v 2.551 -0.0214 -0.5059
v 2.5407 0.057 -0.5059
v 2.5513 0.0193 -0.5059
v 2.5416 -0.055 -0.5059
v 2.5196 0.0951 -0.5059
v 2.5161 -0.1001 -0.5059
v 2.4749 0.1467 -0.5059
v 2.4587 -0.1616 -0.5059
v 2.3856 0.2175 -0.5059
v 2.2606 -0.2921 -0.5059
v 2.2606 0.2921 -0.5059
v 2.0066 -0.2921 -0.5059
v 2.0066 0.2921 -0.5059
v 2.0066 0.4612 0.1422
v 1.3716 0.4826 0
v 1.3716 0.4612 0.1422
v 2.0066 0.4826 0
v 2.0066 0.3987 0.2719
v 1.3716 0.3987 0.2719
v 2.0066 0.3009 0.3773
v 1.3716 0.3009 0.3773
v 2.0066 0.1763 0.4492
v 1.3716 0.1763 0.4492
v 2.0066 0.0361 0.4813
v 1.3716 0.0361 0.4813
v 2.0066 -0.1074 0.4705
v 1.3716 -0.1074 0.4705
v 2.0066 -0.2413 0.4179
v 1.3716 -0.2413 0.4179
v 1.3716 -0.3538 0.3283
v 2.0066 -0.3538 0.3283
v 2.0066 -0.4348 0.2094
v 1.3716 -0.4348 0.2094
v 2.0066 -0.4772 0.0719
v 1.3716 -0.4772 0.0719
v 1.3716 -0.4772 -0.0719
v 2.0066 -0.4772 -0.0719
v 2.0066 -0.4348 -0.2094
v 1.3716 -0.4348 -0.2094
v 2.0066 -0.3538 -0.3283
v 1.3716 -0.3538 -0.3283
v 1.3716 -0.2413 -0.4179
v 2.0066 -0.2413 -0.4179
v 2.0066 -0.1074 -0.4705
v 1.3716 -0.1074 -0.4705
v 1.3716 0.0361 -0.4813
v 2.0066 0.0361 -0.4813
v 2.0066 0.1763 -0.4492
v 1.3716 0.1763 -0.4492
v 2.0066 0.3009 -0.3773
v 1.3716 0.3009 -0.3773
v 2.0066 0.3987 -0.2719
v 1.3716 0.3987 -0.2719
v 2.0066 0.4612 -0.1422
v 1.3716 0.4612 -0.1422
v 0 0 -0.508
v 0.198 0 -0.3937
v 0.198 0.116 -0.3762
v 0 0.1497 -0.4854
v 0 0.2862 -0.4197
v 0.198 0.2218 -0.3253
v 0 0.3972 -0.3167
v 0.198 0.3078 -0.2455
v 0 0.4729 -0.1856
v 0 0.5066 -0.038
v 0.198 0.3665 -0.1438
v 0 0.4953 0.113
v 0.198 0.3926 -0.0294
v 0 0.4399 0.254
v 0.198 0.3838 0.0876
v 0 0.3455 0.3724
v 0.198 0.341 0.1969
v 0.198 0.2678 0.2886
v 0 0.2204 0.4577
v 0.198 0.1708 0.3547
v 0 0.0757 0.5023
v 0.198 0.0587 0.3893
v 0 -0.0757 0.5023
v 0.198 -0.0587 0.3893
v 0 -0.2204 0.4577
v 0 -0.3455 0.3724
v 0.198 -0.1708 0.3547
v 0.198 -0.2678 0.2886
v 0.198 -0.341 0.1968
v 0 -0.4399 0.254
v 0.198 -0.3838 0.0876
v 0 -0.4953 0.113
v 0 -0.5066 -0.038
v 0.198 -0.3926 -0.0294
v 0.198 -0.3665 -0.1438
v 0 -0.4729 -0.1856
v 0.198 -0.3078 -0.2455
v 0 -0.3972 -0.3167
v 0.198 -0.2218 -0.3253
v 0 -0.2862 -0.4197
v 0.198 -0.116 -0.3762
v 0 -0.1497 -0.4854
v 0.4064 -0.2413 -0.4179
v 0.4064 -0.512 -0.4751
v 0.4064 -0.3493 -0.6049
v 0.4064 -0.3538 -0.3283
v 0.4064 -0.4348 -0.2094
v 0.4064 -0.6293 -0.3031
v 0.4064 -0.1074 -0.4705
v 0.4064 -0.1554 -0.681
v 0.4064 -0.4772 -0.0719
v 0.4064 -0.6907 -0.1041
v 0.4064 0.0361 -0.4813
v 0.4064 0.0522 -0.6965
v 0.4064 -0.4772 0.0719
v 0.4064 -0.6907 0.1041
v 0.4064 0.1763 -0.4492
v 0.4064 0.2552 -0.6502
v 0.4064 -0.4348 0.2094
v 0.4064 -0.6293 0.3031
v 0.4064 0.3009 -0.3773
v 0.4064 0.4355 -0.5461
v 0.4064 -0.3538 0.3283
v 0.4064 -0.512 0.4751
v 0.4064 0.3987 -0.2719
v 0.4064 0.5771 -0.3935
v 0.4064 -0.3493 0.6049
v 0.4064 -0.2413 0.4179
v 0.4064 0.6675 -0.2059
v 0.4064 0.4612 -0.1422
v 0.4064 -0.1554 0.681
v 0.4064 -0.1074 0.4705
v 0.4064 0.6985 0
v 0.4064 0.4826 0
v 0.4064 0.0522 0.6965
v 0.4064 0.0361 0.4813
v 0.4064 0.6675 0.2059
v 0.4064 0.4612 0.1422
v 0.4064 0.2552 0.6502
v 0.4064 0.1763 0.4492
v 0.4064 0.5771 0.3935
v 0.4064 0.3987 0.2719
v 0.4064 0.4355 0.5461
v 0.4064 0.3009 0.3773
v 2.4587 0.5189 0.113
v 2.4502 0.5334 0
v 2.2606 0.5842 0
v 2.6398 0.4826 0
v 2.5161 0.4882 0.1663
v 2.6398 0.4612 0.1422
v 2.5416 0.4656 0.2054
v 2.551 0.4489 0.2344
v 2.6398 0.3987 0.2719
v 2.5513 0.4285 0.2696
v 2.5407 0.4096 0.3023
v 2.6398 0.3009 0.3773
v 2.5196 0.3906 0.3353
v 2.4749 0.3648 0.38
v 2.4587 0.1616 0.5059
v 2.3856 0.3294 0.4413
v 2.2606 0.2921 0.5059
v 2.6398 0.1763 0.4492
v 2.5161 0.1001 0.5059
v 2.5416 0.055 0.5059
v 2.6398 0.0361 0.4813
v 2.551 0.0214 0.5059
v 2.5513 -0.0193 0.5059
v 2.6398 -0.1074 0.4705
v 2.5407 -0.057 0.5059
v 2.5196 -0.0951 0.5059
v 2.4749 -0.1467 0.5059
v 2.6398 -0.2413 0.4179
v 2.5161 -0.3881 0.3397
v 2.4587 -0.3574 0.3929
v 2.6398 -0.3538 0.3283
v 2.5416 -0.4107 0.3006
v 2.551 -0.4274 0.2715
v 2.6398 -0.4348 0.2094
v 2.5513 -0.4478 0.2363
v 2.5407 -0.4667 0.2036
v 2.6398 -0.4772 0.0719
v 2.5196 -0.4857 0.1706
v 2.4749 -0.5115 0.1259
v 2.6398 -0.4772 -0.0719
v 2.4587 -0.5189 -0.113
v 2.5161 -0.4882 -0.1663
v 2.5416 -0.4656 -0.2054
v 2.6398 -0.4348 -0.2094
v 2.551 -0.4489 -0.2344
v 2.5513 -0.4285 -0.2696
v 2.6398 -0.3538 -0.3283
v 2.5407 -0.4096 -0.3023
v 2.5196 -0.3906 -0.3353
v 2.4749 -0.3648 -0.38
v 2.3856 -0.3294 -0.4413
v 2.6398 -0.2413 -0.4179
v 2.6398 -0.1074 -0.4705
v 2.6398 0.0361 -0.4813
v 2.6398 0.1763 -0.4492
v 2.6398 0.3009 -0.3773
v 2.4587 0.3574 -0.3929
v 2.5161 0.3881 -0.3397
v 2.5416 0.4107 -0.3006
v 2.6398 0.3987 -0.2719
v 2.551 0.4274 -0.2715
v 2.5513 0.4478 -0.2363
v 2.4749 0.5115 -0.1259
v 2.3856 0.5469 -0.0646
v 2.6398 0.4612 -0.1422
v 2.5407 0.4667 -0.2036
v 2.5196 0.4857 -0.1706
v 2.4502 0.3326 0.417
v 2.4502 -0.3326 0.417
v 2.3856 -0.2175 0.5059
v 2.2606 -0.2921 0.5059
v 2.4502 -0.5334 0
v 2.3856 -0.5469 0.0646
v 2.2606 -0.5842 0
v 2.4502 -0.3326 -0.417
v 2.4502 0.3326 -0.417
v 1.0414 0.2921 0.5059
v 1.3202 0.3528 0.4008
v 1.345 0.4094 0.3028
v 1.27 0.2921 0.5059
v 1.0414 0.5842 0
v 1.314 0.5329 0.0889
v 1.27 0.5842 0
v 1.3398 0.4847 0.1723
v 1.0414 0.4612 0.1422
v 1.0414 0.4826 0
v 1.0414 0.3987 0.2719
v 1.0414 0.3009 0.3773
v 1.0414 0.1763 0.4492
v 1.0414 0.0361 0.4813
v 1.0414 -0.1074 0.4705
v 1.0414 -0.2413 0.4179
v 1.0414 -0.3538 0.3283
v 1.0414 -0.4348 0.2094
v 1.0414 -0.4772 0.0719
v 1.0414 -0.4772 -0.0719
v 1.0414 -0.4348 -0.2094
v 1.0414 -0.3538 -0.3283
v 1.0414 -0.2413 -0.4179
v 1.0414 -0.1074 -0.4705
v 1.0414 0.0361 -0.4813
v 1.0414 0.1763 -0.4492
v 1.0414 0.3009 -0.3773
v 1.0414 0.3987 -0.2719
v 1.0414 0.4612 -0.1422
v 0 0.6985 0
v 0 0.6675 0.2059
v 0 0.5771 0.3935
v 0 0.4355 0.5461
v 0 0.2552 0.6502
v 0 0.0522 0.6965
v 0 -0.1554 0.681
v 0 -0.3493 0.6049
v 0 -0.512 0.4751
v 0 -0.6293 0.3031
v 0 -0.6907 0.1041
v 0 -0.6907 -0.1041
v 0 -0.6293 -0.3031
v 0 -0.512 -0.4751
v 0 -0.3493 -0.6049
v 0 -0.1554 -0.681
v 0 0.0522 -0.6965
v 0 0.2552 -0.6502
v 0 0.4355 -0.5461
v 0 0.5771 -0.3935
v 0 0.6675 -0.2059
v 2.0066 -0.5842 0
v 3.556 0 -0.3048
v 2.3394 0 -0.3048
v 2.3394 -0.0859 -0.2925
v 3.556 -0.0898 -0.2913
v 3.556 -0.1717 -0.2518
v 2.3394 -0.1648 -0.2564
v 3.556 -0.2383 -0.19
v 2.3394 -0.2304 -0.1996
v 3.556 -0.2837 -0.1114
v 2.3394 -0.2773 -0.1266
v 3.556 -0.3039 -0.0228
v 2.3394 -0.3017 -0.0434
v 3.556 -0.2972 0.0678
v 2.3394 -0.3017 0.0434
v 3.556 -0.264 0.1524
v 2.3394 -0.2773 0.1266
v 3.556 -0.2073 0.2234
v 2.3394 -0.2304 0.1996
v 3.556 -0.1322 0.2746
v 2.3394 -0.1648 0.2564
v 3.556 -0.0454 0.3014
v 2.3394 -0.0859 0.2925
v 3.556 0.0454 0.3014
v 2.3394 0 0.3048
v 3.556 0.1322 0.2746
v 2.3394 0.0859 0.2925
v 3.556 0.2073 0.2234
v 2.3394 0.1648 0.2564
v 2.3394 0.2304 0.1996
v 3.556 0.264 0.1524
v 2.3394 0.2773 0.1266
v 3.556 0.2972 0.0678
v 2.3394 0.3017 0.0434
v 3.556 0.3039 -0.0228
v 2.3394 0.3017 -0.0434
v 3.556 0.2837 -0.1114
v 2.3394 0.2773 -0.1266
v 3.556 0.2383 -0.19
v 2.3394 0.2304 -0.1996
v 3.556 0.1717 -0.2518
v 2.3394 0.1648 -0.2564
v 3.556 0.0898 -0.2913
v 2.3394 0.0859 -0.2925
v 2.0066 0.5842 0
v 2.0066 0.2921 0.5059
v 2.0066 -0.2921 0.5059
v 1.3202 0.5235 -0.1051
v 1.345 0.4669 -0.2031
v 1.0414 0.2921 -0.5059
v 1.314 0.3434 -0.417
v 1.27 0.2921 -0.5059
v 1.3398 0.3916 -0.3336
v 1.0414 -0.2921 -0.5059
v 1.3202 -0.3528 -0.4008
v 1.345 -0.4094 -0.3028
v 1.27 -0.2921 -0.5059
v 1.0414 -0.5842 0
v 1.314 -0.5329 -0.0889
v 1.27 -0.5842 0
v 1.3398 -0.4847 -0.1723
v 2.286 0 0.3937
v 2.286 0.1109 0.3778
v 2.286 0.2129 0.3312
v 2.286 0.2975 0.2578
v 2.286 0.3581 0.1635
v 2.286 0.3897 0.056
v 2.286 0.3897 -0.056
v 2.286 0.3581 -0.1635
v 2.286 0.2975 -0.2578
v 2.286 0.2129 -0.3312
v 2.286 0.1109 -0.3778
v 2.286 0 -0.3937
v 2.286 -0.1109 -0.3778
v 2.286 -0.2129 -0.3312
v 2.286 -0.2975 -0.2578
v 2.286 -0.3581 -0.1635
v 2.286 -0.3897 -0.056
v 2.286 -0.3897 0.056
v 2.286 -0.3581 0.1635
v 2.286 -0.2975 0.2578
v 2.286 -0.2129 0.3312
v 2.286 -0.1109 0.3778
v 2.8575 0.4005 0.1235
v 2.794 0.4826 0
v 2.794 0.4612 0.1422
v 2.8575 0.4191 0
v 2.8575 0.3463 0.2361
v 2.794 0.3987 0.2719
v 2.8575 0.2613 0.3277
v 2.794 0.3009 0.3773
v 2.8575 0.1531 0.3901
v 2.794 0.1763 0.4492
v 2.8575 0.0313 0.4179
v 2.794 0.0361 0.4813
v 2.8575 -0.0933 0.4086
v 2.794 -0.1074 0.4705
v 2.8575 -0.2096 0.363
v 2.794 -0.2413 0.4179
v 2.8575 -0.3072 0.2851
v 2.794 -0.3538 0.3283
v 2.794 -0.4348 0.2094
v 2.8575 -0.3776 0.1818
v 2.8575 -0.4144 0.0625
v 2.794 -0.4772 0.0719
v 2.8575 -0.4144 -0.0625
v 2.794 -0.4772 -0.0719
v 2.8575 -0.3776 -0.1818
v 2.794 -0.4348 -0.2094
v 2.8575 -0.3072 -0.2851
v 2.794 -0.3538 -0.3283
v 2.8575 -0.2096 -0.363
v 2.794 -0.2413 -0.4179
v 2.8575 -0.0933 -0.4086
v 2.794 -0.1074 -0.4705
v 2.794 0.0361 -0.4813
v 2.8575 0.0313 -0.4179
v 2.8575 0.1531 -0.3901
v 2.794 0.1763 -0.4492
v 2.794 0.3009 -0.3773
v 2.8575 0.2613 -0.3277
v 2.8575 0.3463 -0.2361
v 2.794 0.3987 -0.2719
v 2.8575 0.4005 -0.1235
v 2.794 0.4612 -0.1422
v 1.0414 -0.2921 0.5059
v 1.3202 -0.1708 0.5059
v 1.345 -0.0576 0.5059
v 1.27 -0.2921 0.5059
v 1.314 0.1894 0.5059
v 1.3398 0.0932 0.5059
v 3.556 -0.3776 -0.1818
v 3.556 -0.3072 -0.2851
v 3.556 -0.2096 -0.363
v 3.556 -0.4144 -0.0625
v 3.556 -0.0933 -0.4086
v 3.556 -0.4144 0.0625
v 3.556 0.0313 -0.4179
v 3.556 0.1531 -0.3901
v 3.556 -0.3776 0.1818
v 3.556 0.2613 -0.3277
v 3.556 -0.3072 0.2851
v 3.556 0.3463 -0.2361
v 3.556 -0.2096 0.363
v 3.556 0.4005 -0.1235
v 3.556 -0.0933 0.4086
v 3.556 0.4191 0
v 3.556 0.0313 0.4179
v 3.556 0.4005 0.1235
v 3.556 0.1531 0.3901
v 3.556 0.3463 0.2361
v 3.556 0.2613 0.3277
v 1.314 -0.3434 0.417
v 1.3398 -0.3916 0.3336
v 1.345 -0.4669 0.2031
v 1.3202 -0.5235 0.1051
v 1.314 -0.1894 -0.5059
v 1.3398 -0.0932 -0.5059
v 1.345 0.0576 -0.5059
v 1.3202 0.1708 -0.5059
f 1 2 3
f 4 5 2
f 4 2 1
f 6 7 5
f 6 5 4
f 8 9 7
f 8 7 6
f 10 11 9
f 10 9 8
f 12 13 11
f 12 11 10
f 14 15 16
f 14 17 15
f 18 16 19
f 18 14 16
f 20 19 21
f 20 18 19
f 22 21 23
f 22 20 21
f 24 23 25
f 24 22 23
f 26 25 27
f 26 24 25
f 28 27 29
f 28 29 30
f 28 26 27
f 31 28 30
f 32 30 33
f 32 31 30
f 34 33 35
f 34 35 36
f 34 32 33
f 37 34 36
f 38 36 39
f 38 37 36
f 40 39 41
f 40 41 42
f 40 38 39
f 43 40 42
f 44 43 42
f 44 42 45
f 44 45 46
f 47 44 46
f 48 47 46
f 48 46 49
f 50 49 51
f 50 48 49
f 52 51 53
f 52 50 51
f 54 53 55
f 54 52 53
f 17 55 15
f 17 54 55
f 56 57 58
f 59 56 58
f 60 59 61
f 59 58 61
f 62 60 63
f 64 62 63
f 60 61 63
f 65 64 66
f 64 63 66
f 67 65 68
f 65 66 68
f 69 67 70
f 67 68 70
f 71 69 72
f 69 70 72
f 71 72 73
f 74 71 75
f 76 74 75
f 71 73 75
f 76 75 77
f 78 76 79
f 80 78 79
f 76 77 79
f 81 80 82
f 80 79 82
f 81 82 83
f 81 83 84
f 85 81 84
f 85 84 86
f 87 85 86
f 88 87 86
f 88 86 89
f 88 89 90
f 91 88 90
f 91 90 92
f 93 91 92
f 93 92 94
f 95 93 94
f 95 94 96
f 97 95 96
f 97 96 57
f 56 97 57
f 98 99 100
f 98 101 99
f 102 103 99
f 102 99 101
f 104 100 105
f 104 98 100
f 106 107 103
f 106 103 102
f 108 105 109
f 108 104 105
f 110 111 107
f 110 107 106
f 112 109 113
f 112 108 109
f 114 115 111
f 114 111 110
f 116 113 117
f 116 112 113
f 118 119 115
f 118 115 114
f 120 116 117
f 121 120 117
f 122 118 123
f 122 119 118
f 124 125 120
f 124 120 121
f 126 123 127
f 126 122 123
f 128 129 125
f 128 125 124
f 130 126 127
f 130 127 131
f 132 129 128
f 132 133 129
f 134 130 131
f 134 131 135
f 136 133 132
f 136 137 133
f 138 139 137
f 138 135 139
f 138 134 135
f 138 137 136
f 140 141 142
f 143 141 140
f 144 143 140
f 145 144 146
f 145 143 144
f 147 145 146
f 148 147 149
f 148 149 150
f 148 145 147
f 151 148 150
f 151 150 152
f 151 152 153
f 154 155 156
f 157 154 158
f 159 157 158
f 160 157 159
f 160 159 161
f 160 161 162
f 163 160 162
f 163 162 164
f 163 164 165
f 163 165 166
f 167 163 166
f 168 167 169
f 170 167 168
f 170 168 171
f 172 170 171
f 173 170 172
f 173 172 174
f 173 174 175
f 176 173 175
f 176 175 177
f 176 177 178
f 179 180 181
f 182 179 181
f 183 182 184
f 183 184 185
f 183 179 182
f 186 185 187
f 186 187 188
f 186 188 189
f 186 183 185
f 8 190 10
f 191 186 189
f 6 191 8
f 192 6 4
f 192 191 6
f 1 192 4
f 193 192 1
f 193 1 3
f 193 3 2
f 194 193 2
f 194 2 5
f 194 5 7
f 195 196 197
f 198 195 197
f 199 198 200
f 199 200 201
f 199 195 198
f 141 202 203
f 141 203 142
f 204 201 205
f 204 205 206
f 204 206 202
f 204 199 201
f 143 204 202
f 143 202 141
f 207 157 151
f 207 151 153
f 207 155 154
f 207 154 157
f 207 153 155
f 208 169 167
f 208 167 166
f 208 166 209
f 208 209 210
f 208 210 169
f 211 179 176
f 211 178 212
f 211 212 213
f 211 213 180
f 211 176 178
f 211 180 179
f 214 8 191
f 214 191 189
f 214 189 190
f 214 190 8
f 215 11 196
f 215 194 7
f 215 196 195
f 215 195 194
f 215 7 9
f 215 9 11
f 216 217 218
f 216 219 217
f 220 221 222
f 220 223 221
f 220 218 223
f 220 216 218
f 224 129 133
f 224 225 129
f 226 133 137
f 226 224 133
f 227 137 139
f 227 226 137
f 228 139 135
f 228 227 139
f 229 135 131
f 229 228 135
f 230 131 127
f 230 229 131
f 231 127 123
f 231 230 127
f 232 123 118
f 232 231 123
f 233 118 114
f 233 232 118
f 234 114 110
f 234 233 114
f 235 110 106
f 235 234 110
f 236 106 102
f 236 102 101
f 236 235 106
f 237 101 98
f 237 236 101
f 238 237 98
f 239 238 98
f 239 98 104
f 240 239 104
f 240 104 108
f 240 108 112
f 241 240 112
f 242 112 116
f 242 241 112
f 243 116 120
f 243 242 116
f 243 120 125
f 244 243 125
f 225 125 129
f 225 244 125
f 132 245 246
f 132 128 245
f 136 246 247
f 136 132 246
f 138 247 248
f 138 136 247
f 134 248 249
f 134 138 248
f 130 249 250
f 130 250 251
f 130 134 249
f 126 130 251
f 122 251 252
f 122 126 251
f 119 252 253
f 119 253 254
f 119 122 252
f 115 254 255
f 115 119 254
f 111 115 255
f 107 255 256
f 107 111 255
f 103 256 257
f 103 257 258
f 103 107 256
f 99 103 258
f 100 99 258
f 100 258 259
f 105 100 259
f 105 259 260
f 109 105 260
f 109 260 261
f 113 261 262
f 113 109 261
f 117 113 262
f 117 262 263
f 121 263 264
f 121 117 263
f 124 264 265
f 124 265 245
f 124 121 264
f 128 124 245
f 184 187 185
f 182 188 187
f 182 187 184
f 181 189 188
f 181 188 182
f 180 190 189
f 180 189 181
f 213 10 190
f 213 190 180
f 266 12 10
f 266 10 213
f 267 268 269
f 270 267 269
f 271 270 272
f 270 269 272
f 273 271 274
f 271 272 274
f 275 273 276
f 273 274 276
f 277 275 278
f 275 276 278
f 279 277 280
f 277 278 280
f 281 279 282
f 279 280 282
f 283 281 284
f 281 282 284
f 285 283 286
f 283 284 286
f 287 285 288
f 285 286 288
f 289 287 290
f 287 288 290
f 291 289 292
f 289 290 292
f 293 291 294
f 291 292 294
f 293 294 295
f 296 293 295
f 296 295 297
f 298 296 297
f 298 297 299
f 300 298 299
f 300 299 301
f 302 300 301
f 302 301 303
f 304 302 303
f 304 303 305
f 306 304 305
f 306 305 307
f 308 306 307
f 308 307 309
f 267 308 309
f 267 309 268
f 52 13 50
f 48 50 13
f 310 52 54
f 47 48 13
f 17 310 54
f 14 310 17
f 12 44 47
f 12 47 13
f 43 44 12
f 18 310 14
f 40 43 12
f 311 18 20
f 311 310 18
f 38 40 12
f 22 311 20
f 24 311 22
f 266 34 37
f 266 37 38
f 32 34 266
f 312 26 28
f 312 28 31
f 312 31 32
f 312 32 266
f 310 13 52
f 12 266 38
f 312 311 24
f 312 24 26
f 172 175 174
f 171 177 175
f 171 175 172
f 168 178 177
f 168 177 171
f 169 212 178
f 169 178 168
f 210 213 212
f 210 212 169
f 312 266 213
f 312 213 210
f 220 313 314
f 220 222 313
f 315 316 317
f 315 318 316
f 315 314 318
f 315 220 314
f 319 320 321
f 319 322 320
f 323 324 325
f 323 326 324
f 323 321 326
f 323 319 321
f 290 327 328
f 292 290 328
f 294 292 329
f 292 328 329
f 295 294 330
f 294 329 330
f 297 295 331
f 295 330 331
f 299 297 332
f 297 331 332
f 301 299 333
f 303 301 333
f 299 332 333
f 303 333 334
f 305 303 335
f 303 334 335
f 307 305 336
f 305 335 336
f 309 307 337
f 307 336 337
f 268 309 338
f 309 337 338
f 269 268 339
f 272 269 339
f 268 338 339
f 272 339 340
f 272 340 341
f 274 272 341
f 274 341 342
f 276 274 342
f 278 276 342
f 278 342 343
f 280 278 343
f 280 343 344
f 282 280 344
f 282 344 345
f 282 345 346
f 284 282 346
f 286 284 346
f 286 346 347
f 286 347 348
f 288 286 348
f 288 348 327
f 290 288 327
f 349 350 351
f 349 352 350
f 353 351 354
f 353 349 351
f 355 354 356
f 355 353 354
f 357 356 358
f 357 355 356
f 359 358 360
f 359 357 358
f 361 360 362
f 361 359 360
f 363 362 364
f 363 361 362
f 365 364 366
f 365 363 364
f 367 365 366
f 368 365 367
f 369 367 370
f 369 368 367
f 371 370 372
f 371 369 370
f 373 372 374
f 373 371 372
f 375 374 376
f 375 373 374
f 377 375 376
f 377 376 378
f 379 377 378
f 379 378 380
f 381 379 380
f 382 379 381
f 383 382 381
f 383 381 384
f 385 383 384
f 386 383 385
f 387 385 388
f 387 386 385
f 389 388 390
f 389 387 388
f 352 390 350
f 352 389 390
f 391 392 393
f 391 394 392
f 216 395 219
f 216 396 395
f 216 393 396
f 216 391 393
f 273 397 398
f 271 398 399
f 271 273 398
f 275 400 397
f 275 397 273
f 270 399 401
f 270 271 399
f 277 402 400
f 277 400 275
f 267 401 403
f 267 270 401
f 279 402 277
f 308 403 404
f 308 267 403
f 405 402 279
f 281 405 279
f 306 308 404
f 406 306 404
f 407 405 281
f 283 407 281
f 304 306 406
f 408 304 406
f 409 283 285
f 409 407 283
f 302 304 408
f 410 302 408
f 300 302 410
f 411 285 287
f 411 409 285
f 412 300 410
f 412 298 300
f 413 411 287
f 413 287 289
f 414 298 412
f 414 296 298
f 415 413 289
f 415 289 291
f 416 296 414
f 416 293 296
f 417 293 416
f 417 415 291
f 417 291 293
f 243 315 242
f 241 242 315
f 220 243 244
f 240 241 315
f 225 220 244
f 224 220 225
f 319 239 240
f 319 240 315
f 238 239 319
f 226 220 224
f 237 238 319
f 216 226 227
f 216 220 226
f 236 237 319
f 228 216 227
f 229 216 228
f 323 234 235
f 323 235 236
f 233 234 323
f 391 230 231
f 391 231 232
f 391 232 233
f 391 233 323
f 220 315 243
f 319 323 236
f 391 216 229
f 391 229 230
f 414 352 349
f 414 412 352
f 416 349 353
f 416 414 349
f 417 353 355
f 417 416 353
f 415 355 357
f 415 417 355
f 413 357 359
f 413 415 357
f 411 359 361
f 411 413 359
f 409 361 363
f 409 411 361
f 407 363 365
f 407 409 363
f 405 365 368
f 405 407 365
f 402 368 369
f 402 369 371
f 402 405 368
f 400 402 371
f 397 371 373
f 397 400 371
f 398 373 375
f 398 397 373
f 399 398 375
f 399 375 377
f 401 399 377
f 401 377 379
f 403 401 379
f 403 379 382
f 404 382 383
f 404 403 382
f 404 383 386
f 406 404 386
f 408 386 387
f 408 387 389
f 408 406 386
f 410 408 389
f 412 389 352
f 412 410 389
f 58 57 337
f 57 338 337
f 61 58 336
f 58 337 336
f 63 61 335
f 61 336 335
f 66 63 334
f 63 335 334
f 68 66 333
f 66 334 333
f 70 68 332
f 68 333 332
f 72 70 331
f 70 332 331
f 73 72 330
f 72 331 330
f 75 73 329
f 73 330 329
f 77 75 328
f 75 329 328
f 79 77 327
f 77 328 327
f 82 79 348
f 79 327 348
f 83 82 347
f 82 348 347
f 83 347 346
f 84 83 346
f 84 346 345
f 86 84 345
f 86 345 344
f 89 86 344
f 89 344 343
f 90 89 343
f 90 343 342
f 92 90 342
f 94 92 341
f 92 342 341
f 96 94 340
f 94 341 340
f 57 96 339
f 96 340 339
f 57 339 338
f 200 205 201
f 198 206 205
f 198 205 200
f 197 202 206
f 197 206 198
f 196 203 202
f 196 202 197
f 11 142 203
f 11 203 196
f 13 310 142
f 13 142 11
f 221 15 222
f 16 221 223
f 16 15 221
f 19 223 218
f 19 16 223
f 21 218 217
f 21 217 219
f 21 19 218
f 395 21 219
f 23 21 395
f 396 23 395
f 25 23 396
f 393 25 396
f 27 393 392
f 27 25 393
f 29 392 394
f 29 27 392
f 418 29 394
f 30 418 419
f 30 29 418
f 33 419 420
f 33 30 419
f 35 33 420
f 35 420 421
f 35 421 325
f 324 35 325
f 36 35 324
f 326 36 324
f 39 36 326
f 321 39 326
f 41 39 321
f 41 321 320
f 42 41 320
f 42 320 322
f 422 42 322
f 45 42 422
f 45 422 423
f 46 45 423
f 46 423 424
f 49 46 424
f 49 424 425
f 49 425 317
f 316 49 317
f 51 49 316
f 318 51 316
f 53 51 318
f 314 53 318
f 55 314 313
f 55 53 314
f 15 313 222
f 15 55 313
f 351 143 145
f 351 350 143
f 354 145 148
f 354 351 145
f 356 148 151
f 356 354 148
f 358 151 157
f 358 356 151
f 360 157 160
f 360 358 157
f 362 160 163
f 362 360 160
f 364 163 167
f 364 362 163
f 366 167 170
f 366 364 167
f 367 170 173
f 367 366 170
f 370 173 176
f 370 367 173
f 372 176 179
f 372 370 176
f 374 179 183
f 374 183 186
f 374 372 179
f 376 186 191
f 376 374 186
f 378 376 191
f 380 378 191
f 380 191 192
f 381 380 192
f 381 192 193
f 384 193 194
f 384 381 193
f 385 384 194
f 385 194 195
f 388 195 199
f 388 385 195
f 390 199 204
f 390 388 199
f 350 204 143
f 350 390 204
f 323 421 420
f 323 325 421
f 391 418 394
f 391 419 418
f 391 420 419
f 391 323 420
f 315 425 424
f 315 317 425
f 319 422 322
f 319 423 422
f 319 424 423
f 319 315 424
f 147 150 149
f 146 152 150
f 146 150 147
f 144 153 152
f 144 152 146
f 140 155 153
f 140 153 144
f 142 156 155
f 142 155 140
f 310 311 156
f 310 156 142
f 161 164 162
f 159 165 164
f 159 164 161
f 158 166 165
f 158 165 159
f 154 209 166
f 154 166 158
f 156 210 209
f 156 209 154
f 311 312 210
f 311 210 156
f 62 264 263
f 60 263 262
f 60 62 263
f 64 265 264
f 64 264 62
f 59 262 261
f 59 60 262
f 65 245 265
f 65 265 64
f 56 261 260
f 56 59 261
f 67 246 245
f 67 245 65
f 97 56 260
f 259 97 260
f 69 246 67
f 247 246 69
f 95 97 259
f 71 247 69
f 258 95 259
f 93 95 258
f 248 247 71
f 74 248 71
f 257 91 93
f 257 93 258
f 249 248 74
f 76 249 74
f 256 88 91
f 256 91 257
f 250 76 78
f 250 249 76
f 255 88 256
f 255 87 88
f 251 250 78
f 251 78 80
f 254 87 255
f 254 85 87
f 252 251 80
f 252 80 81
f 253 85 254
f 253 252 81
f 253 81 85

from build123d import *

# Parameters (mm, degrees)
HOLE1_D               = 0.7874
HOLE1_DEPTH           = 2.286
HOLE1_CSINK_D         = 1.016
HOLE1_CSINK_ANGLE     = 60
HOLE1_TIP             = 0.236558826
HOLE2_D               = 0.6096
SKETCH6_R             = 0.635
EXTRUSIONBLIND1_DEPTH = 1.6764


with BuildPart() as part:
    # Sketch1 → RevolutionAngle1 (revolve)
    with BuildSketch(Plane.XY):
        Polygon((0.4064, 0.4826), (1.0414, 0.4826), (1.0414, 0.5842), (1.27, 0.5842), (1.3716, 0.4826), (2.0066, 0.4826), (2.0066, 0.5842), (2.2606, 0.5842), (2.639776362, 0.4826), (2.794, 0.4826), (2.8575, 0.4191), (3.556, 0.4191), (3.556, 0), (0, 0), (0, 0.6985), (0.4064, 0.6985), align=None)
    revolve(axis=Axis((0, 0, 0), (1, 0, 0)))

    # Hole1
    with Locations(Plane.ZY):
        with Locations((0, 0)):
            CounterSinkHole(HOLE1_D / 2, HOLE1_CSINK_D / 2, depth=HOLE1_DEPTH, counter_sink_angle=HOLE1_CSINK_ANGLE)
            with Locations((0, 0, -(HOLE1_DEPTH + HOLE1_TIP / 2))):  # 118° drill point
                Cone(0, HOLE1_D / 2, HOLE1_TIP, mode=Mode.SUBTRACT)

    # Hole2 (through all)
    with Locations(Plane(origin=(3.556, 0, 0), x_dir=(0, 0, 1), z_dir=(1, 0, 0))):
        with Locations((0, 0)):
            Hole(HOLE2_D / 2)

    # Sketch6 → ExtrusionBlind1 (cut)
    with BuildSketch(Plane.ZY.offset(-1.0414)):
        Circle(SKETCH6_R)
        Polygon((0, 0.5842), (-0.505932041, 0.2921), (-0.505932041, -0.2921), (0, -0.5842), (0.505932041, -0.2921), (0.505932041, 0.2921), align=None, mode=Mode.SUBTRACT)
    extrude(amount=-EXTRUSIONBLIND1_DEPTH, mode=Mode.SUBTRACT)


solid = part.part
